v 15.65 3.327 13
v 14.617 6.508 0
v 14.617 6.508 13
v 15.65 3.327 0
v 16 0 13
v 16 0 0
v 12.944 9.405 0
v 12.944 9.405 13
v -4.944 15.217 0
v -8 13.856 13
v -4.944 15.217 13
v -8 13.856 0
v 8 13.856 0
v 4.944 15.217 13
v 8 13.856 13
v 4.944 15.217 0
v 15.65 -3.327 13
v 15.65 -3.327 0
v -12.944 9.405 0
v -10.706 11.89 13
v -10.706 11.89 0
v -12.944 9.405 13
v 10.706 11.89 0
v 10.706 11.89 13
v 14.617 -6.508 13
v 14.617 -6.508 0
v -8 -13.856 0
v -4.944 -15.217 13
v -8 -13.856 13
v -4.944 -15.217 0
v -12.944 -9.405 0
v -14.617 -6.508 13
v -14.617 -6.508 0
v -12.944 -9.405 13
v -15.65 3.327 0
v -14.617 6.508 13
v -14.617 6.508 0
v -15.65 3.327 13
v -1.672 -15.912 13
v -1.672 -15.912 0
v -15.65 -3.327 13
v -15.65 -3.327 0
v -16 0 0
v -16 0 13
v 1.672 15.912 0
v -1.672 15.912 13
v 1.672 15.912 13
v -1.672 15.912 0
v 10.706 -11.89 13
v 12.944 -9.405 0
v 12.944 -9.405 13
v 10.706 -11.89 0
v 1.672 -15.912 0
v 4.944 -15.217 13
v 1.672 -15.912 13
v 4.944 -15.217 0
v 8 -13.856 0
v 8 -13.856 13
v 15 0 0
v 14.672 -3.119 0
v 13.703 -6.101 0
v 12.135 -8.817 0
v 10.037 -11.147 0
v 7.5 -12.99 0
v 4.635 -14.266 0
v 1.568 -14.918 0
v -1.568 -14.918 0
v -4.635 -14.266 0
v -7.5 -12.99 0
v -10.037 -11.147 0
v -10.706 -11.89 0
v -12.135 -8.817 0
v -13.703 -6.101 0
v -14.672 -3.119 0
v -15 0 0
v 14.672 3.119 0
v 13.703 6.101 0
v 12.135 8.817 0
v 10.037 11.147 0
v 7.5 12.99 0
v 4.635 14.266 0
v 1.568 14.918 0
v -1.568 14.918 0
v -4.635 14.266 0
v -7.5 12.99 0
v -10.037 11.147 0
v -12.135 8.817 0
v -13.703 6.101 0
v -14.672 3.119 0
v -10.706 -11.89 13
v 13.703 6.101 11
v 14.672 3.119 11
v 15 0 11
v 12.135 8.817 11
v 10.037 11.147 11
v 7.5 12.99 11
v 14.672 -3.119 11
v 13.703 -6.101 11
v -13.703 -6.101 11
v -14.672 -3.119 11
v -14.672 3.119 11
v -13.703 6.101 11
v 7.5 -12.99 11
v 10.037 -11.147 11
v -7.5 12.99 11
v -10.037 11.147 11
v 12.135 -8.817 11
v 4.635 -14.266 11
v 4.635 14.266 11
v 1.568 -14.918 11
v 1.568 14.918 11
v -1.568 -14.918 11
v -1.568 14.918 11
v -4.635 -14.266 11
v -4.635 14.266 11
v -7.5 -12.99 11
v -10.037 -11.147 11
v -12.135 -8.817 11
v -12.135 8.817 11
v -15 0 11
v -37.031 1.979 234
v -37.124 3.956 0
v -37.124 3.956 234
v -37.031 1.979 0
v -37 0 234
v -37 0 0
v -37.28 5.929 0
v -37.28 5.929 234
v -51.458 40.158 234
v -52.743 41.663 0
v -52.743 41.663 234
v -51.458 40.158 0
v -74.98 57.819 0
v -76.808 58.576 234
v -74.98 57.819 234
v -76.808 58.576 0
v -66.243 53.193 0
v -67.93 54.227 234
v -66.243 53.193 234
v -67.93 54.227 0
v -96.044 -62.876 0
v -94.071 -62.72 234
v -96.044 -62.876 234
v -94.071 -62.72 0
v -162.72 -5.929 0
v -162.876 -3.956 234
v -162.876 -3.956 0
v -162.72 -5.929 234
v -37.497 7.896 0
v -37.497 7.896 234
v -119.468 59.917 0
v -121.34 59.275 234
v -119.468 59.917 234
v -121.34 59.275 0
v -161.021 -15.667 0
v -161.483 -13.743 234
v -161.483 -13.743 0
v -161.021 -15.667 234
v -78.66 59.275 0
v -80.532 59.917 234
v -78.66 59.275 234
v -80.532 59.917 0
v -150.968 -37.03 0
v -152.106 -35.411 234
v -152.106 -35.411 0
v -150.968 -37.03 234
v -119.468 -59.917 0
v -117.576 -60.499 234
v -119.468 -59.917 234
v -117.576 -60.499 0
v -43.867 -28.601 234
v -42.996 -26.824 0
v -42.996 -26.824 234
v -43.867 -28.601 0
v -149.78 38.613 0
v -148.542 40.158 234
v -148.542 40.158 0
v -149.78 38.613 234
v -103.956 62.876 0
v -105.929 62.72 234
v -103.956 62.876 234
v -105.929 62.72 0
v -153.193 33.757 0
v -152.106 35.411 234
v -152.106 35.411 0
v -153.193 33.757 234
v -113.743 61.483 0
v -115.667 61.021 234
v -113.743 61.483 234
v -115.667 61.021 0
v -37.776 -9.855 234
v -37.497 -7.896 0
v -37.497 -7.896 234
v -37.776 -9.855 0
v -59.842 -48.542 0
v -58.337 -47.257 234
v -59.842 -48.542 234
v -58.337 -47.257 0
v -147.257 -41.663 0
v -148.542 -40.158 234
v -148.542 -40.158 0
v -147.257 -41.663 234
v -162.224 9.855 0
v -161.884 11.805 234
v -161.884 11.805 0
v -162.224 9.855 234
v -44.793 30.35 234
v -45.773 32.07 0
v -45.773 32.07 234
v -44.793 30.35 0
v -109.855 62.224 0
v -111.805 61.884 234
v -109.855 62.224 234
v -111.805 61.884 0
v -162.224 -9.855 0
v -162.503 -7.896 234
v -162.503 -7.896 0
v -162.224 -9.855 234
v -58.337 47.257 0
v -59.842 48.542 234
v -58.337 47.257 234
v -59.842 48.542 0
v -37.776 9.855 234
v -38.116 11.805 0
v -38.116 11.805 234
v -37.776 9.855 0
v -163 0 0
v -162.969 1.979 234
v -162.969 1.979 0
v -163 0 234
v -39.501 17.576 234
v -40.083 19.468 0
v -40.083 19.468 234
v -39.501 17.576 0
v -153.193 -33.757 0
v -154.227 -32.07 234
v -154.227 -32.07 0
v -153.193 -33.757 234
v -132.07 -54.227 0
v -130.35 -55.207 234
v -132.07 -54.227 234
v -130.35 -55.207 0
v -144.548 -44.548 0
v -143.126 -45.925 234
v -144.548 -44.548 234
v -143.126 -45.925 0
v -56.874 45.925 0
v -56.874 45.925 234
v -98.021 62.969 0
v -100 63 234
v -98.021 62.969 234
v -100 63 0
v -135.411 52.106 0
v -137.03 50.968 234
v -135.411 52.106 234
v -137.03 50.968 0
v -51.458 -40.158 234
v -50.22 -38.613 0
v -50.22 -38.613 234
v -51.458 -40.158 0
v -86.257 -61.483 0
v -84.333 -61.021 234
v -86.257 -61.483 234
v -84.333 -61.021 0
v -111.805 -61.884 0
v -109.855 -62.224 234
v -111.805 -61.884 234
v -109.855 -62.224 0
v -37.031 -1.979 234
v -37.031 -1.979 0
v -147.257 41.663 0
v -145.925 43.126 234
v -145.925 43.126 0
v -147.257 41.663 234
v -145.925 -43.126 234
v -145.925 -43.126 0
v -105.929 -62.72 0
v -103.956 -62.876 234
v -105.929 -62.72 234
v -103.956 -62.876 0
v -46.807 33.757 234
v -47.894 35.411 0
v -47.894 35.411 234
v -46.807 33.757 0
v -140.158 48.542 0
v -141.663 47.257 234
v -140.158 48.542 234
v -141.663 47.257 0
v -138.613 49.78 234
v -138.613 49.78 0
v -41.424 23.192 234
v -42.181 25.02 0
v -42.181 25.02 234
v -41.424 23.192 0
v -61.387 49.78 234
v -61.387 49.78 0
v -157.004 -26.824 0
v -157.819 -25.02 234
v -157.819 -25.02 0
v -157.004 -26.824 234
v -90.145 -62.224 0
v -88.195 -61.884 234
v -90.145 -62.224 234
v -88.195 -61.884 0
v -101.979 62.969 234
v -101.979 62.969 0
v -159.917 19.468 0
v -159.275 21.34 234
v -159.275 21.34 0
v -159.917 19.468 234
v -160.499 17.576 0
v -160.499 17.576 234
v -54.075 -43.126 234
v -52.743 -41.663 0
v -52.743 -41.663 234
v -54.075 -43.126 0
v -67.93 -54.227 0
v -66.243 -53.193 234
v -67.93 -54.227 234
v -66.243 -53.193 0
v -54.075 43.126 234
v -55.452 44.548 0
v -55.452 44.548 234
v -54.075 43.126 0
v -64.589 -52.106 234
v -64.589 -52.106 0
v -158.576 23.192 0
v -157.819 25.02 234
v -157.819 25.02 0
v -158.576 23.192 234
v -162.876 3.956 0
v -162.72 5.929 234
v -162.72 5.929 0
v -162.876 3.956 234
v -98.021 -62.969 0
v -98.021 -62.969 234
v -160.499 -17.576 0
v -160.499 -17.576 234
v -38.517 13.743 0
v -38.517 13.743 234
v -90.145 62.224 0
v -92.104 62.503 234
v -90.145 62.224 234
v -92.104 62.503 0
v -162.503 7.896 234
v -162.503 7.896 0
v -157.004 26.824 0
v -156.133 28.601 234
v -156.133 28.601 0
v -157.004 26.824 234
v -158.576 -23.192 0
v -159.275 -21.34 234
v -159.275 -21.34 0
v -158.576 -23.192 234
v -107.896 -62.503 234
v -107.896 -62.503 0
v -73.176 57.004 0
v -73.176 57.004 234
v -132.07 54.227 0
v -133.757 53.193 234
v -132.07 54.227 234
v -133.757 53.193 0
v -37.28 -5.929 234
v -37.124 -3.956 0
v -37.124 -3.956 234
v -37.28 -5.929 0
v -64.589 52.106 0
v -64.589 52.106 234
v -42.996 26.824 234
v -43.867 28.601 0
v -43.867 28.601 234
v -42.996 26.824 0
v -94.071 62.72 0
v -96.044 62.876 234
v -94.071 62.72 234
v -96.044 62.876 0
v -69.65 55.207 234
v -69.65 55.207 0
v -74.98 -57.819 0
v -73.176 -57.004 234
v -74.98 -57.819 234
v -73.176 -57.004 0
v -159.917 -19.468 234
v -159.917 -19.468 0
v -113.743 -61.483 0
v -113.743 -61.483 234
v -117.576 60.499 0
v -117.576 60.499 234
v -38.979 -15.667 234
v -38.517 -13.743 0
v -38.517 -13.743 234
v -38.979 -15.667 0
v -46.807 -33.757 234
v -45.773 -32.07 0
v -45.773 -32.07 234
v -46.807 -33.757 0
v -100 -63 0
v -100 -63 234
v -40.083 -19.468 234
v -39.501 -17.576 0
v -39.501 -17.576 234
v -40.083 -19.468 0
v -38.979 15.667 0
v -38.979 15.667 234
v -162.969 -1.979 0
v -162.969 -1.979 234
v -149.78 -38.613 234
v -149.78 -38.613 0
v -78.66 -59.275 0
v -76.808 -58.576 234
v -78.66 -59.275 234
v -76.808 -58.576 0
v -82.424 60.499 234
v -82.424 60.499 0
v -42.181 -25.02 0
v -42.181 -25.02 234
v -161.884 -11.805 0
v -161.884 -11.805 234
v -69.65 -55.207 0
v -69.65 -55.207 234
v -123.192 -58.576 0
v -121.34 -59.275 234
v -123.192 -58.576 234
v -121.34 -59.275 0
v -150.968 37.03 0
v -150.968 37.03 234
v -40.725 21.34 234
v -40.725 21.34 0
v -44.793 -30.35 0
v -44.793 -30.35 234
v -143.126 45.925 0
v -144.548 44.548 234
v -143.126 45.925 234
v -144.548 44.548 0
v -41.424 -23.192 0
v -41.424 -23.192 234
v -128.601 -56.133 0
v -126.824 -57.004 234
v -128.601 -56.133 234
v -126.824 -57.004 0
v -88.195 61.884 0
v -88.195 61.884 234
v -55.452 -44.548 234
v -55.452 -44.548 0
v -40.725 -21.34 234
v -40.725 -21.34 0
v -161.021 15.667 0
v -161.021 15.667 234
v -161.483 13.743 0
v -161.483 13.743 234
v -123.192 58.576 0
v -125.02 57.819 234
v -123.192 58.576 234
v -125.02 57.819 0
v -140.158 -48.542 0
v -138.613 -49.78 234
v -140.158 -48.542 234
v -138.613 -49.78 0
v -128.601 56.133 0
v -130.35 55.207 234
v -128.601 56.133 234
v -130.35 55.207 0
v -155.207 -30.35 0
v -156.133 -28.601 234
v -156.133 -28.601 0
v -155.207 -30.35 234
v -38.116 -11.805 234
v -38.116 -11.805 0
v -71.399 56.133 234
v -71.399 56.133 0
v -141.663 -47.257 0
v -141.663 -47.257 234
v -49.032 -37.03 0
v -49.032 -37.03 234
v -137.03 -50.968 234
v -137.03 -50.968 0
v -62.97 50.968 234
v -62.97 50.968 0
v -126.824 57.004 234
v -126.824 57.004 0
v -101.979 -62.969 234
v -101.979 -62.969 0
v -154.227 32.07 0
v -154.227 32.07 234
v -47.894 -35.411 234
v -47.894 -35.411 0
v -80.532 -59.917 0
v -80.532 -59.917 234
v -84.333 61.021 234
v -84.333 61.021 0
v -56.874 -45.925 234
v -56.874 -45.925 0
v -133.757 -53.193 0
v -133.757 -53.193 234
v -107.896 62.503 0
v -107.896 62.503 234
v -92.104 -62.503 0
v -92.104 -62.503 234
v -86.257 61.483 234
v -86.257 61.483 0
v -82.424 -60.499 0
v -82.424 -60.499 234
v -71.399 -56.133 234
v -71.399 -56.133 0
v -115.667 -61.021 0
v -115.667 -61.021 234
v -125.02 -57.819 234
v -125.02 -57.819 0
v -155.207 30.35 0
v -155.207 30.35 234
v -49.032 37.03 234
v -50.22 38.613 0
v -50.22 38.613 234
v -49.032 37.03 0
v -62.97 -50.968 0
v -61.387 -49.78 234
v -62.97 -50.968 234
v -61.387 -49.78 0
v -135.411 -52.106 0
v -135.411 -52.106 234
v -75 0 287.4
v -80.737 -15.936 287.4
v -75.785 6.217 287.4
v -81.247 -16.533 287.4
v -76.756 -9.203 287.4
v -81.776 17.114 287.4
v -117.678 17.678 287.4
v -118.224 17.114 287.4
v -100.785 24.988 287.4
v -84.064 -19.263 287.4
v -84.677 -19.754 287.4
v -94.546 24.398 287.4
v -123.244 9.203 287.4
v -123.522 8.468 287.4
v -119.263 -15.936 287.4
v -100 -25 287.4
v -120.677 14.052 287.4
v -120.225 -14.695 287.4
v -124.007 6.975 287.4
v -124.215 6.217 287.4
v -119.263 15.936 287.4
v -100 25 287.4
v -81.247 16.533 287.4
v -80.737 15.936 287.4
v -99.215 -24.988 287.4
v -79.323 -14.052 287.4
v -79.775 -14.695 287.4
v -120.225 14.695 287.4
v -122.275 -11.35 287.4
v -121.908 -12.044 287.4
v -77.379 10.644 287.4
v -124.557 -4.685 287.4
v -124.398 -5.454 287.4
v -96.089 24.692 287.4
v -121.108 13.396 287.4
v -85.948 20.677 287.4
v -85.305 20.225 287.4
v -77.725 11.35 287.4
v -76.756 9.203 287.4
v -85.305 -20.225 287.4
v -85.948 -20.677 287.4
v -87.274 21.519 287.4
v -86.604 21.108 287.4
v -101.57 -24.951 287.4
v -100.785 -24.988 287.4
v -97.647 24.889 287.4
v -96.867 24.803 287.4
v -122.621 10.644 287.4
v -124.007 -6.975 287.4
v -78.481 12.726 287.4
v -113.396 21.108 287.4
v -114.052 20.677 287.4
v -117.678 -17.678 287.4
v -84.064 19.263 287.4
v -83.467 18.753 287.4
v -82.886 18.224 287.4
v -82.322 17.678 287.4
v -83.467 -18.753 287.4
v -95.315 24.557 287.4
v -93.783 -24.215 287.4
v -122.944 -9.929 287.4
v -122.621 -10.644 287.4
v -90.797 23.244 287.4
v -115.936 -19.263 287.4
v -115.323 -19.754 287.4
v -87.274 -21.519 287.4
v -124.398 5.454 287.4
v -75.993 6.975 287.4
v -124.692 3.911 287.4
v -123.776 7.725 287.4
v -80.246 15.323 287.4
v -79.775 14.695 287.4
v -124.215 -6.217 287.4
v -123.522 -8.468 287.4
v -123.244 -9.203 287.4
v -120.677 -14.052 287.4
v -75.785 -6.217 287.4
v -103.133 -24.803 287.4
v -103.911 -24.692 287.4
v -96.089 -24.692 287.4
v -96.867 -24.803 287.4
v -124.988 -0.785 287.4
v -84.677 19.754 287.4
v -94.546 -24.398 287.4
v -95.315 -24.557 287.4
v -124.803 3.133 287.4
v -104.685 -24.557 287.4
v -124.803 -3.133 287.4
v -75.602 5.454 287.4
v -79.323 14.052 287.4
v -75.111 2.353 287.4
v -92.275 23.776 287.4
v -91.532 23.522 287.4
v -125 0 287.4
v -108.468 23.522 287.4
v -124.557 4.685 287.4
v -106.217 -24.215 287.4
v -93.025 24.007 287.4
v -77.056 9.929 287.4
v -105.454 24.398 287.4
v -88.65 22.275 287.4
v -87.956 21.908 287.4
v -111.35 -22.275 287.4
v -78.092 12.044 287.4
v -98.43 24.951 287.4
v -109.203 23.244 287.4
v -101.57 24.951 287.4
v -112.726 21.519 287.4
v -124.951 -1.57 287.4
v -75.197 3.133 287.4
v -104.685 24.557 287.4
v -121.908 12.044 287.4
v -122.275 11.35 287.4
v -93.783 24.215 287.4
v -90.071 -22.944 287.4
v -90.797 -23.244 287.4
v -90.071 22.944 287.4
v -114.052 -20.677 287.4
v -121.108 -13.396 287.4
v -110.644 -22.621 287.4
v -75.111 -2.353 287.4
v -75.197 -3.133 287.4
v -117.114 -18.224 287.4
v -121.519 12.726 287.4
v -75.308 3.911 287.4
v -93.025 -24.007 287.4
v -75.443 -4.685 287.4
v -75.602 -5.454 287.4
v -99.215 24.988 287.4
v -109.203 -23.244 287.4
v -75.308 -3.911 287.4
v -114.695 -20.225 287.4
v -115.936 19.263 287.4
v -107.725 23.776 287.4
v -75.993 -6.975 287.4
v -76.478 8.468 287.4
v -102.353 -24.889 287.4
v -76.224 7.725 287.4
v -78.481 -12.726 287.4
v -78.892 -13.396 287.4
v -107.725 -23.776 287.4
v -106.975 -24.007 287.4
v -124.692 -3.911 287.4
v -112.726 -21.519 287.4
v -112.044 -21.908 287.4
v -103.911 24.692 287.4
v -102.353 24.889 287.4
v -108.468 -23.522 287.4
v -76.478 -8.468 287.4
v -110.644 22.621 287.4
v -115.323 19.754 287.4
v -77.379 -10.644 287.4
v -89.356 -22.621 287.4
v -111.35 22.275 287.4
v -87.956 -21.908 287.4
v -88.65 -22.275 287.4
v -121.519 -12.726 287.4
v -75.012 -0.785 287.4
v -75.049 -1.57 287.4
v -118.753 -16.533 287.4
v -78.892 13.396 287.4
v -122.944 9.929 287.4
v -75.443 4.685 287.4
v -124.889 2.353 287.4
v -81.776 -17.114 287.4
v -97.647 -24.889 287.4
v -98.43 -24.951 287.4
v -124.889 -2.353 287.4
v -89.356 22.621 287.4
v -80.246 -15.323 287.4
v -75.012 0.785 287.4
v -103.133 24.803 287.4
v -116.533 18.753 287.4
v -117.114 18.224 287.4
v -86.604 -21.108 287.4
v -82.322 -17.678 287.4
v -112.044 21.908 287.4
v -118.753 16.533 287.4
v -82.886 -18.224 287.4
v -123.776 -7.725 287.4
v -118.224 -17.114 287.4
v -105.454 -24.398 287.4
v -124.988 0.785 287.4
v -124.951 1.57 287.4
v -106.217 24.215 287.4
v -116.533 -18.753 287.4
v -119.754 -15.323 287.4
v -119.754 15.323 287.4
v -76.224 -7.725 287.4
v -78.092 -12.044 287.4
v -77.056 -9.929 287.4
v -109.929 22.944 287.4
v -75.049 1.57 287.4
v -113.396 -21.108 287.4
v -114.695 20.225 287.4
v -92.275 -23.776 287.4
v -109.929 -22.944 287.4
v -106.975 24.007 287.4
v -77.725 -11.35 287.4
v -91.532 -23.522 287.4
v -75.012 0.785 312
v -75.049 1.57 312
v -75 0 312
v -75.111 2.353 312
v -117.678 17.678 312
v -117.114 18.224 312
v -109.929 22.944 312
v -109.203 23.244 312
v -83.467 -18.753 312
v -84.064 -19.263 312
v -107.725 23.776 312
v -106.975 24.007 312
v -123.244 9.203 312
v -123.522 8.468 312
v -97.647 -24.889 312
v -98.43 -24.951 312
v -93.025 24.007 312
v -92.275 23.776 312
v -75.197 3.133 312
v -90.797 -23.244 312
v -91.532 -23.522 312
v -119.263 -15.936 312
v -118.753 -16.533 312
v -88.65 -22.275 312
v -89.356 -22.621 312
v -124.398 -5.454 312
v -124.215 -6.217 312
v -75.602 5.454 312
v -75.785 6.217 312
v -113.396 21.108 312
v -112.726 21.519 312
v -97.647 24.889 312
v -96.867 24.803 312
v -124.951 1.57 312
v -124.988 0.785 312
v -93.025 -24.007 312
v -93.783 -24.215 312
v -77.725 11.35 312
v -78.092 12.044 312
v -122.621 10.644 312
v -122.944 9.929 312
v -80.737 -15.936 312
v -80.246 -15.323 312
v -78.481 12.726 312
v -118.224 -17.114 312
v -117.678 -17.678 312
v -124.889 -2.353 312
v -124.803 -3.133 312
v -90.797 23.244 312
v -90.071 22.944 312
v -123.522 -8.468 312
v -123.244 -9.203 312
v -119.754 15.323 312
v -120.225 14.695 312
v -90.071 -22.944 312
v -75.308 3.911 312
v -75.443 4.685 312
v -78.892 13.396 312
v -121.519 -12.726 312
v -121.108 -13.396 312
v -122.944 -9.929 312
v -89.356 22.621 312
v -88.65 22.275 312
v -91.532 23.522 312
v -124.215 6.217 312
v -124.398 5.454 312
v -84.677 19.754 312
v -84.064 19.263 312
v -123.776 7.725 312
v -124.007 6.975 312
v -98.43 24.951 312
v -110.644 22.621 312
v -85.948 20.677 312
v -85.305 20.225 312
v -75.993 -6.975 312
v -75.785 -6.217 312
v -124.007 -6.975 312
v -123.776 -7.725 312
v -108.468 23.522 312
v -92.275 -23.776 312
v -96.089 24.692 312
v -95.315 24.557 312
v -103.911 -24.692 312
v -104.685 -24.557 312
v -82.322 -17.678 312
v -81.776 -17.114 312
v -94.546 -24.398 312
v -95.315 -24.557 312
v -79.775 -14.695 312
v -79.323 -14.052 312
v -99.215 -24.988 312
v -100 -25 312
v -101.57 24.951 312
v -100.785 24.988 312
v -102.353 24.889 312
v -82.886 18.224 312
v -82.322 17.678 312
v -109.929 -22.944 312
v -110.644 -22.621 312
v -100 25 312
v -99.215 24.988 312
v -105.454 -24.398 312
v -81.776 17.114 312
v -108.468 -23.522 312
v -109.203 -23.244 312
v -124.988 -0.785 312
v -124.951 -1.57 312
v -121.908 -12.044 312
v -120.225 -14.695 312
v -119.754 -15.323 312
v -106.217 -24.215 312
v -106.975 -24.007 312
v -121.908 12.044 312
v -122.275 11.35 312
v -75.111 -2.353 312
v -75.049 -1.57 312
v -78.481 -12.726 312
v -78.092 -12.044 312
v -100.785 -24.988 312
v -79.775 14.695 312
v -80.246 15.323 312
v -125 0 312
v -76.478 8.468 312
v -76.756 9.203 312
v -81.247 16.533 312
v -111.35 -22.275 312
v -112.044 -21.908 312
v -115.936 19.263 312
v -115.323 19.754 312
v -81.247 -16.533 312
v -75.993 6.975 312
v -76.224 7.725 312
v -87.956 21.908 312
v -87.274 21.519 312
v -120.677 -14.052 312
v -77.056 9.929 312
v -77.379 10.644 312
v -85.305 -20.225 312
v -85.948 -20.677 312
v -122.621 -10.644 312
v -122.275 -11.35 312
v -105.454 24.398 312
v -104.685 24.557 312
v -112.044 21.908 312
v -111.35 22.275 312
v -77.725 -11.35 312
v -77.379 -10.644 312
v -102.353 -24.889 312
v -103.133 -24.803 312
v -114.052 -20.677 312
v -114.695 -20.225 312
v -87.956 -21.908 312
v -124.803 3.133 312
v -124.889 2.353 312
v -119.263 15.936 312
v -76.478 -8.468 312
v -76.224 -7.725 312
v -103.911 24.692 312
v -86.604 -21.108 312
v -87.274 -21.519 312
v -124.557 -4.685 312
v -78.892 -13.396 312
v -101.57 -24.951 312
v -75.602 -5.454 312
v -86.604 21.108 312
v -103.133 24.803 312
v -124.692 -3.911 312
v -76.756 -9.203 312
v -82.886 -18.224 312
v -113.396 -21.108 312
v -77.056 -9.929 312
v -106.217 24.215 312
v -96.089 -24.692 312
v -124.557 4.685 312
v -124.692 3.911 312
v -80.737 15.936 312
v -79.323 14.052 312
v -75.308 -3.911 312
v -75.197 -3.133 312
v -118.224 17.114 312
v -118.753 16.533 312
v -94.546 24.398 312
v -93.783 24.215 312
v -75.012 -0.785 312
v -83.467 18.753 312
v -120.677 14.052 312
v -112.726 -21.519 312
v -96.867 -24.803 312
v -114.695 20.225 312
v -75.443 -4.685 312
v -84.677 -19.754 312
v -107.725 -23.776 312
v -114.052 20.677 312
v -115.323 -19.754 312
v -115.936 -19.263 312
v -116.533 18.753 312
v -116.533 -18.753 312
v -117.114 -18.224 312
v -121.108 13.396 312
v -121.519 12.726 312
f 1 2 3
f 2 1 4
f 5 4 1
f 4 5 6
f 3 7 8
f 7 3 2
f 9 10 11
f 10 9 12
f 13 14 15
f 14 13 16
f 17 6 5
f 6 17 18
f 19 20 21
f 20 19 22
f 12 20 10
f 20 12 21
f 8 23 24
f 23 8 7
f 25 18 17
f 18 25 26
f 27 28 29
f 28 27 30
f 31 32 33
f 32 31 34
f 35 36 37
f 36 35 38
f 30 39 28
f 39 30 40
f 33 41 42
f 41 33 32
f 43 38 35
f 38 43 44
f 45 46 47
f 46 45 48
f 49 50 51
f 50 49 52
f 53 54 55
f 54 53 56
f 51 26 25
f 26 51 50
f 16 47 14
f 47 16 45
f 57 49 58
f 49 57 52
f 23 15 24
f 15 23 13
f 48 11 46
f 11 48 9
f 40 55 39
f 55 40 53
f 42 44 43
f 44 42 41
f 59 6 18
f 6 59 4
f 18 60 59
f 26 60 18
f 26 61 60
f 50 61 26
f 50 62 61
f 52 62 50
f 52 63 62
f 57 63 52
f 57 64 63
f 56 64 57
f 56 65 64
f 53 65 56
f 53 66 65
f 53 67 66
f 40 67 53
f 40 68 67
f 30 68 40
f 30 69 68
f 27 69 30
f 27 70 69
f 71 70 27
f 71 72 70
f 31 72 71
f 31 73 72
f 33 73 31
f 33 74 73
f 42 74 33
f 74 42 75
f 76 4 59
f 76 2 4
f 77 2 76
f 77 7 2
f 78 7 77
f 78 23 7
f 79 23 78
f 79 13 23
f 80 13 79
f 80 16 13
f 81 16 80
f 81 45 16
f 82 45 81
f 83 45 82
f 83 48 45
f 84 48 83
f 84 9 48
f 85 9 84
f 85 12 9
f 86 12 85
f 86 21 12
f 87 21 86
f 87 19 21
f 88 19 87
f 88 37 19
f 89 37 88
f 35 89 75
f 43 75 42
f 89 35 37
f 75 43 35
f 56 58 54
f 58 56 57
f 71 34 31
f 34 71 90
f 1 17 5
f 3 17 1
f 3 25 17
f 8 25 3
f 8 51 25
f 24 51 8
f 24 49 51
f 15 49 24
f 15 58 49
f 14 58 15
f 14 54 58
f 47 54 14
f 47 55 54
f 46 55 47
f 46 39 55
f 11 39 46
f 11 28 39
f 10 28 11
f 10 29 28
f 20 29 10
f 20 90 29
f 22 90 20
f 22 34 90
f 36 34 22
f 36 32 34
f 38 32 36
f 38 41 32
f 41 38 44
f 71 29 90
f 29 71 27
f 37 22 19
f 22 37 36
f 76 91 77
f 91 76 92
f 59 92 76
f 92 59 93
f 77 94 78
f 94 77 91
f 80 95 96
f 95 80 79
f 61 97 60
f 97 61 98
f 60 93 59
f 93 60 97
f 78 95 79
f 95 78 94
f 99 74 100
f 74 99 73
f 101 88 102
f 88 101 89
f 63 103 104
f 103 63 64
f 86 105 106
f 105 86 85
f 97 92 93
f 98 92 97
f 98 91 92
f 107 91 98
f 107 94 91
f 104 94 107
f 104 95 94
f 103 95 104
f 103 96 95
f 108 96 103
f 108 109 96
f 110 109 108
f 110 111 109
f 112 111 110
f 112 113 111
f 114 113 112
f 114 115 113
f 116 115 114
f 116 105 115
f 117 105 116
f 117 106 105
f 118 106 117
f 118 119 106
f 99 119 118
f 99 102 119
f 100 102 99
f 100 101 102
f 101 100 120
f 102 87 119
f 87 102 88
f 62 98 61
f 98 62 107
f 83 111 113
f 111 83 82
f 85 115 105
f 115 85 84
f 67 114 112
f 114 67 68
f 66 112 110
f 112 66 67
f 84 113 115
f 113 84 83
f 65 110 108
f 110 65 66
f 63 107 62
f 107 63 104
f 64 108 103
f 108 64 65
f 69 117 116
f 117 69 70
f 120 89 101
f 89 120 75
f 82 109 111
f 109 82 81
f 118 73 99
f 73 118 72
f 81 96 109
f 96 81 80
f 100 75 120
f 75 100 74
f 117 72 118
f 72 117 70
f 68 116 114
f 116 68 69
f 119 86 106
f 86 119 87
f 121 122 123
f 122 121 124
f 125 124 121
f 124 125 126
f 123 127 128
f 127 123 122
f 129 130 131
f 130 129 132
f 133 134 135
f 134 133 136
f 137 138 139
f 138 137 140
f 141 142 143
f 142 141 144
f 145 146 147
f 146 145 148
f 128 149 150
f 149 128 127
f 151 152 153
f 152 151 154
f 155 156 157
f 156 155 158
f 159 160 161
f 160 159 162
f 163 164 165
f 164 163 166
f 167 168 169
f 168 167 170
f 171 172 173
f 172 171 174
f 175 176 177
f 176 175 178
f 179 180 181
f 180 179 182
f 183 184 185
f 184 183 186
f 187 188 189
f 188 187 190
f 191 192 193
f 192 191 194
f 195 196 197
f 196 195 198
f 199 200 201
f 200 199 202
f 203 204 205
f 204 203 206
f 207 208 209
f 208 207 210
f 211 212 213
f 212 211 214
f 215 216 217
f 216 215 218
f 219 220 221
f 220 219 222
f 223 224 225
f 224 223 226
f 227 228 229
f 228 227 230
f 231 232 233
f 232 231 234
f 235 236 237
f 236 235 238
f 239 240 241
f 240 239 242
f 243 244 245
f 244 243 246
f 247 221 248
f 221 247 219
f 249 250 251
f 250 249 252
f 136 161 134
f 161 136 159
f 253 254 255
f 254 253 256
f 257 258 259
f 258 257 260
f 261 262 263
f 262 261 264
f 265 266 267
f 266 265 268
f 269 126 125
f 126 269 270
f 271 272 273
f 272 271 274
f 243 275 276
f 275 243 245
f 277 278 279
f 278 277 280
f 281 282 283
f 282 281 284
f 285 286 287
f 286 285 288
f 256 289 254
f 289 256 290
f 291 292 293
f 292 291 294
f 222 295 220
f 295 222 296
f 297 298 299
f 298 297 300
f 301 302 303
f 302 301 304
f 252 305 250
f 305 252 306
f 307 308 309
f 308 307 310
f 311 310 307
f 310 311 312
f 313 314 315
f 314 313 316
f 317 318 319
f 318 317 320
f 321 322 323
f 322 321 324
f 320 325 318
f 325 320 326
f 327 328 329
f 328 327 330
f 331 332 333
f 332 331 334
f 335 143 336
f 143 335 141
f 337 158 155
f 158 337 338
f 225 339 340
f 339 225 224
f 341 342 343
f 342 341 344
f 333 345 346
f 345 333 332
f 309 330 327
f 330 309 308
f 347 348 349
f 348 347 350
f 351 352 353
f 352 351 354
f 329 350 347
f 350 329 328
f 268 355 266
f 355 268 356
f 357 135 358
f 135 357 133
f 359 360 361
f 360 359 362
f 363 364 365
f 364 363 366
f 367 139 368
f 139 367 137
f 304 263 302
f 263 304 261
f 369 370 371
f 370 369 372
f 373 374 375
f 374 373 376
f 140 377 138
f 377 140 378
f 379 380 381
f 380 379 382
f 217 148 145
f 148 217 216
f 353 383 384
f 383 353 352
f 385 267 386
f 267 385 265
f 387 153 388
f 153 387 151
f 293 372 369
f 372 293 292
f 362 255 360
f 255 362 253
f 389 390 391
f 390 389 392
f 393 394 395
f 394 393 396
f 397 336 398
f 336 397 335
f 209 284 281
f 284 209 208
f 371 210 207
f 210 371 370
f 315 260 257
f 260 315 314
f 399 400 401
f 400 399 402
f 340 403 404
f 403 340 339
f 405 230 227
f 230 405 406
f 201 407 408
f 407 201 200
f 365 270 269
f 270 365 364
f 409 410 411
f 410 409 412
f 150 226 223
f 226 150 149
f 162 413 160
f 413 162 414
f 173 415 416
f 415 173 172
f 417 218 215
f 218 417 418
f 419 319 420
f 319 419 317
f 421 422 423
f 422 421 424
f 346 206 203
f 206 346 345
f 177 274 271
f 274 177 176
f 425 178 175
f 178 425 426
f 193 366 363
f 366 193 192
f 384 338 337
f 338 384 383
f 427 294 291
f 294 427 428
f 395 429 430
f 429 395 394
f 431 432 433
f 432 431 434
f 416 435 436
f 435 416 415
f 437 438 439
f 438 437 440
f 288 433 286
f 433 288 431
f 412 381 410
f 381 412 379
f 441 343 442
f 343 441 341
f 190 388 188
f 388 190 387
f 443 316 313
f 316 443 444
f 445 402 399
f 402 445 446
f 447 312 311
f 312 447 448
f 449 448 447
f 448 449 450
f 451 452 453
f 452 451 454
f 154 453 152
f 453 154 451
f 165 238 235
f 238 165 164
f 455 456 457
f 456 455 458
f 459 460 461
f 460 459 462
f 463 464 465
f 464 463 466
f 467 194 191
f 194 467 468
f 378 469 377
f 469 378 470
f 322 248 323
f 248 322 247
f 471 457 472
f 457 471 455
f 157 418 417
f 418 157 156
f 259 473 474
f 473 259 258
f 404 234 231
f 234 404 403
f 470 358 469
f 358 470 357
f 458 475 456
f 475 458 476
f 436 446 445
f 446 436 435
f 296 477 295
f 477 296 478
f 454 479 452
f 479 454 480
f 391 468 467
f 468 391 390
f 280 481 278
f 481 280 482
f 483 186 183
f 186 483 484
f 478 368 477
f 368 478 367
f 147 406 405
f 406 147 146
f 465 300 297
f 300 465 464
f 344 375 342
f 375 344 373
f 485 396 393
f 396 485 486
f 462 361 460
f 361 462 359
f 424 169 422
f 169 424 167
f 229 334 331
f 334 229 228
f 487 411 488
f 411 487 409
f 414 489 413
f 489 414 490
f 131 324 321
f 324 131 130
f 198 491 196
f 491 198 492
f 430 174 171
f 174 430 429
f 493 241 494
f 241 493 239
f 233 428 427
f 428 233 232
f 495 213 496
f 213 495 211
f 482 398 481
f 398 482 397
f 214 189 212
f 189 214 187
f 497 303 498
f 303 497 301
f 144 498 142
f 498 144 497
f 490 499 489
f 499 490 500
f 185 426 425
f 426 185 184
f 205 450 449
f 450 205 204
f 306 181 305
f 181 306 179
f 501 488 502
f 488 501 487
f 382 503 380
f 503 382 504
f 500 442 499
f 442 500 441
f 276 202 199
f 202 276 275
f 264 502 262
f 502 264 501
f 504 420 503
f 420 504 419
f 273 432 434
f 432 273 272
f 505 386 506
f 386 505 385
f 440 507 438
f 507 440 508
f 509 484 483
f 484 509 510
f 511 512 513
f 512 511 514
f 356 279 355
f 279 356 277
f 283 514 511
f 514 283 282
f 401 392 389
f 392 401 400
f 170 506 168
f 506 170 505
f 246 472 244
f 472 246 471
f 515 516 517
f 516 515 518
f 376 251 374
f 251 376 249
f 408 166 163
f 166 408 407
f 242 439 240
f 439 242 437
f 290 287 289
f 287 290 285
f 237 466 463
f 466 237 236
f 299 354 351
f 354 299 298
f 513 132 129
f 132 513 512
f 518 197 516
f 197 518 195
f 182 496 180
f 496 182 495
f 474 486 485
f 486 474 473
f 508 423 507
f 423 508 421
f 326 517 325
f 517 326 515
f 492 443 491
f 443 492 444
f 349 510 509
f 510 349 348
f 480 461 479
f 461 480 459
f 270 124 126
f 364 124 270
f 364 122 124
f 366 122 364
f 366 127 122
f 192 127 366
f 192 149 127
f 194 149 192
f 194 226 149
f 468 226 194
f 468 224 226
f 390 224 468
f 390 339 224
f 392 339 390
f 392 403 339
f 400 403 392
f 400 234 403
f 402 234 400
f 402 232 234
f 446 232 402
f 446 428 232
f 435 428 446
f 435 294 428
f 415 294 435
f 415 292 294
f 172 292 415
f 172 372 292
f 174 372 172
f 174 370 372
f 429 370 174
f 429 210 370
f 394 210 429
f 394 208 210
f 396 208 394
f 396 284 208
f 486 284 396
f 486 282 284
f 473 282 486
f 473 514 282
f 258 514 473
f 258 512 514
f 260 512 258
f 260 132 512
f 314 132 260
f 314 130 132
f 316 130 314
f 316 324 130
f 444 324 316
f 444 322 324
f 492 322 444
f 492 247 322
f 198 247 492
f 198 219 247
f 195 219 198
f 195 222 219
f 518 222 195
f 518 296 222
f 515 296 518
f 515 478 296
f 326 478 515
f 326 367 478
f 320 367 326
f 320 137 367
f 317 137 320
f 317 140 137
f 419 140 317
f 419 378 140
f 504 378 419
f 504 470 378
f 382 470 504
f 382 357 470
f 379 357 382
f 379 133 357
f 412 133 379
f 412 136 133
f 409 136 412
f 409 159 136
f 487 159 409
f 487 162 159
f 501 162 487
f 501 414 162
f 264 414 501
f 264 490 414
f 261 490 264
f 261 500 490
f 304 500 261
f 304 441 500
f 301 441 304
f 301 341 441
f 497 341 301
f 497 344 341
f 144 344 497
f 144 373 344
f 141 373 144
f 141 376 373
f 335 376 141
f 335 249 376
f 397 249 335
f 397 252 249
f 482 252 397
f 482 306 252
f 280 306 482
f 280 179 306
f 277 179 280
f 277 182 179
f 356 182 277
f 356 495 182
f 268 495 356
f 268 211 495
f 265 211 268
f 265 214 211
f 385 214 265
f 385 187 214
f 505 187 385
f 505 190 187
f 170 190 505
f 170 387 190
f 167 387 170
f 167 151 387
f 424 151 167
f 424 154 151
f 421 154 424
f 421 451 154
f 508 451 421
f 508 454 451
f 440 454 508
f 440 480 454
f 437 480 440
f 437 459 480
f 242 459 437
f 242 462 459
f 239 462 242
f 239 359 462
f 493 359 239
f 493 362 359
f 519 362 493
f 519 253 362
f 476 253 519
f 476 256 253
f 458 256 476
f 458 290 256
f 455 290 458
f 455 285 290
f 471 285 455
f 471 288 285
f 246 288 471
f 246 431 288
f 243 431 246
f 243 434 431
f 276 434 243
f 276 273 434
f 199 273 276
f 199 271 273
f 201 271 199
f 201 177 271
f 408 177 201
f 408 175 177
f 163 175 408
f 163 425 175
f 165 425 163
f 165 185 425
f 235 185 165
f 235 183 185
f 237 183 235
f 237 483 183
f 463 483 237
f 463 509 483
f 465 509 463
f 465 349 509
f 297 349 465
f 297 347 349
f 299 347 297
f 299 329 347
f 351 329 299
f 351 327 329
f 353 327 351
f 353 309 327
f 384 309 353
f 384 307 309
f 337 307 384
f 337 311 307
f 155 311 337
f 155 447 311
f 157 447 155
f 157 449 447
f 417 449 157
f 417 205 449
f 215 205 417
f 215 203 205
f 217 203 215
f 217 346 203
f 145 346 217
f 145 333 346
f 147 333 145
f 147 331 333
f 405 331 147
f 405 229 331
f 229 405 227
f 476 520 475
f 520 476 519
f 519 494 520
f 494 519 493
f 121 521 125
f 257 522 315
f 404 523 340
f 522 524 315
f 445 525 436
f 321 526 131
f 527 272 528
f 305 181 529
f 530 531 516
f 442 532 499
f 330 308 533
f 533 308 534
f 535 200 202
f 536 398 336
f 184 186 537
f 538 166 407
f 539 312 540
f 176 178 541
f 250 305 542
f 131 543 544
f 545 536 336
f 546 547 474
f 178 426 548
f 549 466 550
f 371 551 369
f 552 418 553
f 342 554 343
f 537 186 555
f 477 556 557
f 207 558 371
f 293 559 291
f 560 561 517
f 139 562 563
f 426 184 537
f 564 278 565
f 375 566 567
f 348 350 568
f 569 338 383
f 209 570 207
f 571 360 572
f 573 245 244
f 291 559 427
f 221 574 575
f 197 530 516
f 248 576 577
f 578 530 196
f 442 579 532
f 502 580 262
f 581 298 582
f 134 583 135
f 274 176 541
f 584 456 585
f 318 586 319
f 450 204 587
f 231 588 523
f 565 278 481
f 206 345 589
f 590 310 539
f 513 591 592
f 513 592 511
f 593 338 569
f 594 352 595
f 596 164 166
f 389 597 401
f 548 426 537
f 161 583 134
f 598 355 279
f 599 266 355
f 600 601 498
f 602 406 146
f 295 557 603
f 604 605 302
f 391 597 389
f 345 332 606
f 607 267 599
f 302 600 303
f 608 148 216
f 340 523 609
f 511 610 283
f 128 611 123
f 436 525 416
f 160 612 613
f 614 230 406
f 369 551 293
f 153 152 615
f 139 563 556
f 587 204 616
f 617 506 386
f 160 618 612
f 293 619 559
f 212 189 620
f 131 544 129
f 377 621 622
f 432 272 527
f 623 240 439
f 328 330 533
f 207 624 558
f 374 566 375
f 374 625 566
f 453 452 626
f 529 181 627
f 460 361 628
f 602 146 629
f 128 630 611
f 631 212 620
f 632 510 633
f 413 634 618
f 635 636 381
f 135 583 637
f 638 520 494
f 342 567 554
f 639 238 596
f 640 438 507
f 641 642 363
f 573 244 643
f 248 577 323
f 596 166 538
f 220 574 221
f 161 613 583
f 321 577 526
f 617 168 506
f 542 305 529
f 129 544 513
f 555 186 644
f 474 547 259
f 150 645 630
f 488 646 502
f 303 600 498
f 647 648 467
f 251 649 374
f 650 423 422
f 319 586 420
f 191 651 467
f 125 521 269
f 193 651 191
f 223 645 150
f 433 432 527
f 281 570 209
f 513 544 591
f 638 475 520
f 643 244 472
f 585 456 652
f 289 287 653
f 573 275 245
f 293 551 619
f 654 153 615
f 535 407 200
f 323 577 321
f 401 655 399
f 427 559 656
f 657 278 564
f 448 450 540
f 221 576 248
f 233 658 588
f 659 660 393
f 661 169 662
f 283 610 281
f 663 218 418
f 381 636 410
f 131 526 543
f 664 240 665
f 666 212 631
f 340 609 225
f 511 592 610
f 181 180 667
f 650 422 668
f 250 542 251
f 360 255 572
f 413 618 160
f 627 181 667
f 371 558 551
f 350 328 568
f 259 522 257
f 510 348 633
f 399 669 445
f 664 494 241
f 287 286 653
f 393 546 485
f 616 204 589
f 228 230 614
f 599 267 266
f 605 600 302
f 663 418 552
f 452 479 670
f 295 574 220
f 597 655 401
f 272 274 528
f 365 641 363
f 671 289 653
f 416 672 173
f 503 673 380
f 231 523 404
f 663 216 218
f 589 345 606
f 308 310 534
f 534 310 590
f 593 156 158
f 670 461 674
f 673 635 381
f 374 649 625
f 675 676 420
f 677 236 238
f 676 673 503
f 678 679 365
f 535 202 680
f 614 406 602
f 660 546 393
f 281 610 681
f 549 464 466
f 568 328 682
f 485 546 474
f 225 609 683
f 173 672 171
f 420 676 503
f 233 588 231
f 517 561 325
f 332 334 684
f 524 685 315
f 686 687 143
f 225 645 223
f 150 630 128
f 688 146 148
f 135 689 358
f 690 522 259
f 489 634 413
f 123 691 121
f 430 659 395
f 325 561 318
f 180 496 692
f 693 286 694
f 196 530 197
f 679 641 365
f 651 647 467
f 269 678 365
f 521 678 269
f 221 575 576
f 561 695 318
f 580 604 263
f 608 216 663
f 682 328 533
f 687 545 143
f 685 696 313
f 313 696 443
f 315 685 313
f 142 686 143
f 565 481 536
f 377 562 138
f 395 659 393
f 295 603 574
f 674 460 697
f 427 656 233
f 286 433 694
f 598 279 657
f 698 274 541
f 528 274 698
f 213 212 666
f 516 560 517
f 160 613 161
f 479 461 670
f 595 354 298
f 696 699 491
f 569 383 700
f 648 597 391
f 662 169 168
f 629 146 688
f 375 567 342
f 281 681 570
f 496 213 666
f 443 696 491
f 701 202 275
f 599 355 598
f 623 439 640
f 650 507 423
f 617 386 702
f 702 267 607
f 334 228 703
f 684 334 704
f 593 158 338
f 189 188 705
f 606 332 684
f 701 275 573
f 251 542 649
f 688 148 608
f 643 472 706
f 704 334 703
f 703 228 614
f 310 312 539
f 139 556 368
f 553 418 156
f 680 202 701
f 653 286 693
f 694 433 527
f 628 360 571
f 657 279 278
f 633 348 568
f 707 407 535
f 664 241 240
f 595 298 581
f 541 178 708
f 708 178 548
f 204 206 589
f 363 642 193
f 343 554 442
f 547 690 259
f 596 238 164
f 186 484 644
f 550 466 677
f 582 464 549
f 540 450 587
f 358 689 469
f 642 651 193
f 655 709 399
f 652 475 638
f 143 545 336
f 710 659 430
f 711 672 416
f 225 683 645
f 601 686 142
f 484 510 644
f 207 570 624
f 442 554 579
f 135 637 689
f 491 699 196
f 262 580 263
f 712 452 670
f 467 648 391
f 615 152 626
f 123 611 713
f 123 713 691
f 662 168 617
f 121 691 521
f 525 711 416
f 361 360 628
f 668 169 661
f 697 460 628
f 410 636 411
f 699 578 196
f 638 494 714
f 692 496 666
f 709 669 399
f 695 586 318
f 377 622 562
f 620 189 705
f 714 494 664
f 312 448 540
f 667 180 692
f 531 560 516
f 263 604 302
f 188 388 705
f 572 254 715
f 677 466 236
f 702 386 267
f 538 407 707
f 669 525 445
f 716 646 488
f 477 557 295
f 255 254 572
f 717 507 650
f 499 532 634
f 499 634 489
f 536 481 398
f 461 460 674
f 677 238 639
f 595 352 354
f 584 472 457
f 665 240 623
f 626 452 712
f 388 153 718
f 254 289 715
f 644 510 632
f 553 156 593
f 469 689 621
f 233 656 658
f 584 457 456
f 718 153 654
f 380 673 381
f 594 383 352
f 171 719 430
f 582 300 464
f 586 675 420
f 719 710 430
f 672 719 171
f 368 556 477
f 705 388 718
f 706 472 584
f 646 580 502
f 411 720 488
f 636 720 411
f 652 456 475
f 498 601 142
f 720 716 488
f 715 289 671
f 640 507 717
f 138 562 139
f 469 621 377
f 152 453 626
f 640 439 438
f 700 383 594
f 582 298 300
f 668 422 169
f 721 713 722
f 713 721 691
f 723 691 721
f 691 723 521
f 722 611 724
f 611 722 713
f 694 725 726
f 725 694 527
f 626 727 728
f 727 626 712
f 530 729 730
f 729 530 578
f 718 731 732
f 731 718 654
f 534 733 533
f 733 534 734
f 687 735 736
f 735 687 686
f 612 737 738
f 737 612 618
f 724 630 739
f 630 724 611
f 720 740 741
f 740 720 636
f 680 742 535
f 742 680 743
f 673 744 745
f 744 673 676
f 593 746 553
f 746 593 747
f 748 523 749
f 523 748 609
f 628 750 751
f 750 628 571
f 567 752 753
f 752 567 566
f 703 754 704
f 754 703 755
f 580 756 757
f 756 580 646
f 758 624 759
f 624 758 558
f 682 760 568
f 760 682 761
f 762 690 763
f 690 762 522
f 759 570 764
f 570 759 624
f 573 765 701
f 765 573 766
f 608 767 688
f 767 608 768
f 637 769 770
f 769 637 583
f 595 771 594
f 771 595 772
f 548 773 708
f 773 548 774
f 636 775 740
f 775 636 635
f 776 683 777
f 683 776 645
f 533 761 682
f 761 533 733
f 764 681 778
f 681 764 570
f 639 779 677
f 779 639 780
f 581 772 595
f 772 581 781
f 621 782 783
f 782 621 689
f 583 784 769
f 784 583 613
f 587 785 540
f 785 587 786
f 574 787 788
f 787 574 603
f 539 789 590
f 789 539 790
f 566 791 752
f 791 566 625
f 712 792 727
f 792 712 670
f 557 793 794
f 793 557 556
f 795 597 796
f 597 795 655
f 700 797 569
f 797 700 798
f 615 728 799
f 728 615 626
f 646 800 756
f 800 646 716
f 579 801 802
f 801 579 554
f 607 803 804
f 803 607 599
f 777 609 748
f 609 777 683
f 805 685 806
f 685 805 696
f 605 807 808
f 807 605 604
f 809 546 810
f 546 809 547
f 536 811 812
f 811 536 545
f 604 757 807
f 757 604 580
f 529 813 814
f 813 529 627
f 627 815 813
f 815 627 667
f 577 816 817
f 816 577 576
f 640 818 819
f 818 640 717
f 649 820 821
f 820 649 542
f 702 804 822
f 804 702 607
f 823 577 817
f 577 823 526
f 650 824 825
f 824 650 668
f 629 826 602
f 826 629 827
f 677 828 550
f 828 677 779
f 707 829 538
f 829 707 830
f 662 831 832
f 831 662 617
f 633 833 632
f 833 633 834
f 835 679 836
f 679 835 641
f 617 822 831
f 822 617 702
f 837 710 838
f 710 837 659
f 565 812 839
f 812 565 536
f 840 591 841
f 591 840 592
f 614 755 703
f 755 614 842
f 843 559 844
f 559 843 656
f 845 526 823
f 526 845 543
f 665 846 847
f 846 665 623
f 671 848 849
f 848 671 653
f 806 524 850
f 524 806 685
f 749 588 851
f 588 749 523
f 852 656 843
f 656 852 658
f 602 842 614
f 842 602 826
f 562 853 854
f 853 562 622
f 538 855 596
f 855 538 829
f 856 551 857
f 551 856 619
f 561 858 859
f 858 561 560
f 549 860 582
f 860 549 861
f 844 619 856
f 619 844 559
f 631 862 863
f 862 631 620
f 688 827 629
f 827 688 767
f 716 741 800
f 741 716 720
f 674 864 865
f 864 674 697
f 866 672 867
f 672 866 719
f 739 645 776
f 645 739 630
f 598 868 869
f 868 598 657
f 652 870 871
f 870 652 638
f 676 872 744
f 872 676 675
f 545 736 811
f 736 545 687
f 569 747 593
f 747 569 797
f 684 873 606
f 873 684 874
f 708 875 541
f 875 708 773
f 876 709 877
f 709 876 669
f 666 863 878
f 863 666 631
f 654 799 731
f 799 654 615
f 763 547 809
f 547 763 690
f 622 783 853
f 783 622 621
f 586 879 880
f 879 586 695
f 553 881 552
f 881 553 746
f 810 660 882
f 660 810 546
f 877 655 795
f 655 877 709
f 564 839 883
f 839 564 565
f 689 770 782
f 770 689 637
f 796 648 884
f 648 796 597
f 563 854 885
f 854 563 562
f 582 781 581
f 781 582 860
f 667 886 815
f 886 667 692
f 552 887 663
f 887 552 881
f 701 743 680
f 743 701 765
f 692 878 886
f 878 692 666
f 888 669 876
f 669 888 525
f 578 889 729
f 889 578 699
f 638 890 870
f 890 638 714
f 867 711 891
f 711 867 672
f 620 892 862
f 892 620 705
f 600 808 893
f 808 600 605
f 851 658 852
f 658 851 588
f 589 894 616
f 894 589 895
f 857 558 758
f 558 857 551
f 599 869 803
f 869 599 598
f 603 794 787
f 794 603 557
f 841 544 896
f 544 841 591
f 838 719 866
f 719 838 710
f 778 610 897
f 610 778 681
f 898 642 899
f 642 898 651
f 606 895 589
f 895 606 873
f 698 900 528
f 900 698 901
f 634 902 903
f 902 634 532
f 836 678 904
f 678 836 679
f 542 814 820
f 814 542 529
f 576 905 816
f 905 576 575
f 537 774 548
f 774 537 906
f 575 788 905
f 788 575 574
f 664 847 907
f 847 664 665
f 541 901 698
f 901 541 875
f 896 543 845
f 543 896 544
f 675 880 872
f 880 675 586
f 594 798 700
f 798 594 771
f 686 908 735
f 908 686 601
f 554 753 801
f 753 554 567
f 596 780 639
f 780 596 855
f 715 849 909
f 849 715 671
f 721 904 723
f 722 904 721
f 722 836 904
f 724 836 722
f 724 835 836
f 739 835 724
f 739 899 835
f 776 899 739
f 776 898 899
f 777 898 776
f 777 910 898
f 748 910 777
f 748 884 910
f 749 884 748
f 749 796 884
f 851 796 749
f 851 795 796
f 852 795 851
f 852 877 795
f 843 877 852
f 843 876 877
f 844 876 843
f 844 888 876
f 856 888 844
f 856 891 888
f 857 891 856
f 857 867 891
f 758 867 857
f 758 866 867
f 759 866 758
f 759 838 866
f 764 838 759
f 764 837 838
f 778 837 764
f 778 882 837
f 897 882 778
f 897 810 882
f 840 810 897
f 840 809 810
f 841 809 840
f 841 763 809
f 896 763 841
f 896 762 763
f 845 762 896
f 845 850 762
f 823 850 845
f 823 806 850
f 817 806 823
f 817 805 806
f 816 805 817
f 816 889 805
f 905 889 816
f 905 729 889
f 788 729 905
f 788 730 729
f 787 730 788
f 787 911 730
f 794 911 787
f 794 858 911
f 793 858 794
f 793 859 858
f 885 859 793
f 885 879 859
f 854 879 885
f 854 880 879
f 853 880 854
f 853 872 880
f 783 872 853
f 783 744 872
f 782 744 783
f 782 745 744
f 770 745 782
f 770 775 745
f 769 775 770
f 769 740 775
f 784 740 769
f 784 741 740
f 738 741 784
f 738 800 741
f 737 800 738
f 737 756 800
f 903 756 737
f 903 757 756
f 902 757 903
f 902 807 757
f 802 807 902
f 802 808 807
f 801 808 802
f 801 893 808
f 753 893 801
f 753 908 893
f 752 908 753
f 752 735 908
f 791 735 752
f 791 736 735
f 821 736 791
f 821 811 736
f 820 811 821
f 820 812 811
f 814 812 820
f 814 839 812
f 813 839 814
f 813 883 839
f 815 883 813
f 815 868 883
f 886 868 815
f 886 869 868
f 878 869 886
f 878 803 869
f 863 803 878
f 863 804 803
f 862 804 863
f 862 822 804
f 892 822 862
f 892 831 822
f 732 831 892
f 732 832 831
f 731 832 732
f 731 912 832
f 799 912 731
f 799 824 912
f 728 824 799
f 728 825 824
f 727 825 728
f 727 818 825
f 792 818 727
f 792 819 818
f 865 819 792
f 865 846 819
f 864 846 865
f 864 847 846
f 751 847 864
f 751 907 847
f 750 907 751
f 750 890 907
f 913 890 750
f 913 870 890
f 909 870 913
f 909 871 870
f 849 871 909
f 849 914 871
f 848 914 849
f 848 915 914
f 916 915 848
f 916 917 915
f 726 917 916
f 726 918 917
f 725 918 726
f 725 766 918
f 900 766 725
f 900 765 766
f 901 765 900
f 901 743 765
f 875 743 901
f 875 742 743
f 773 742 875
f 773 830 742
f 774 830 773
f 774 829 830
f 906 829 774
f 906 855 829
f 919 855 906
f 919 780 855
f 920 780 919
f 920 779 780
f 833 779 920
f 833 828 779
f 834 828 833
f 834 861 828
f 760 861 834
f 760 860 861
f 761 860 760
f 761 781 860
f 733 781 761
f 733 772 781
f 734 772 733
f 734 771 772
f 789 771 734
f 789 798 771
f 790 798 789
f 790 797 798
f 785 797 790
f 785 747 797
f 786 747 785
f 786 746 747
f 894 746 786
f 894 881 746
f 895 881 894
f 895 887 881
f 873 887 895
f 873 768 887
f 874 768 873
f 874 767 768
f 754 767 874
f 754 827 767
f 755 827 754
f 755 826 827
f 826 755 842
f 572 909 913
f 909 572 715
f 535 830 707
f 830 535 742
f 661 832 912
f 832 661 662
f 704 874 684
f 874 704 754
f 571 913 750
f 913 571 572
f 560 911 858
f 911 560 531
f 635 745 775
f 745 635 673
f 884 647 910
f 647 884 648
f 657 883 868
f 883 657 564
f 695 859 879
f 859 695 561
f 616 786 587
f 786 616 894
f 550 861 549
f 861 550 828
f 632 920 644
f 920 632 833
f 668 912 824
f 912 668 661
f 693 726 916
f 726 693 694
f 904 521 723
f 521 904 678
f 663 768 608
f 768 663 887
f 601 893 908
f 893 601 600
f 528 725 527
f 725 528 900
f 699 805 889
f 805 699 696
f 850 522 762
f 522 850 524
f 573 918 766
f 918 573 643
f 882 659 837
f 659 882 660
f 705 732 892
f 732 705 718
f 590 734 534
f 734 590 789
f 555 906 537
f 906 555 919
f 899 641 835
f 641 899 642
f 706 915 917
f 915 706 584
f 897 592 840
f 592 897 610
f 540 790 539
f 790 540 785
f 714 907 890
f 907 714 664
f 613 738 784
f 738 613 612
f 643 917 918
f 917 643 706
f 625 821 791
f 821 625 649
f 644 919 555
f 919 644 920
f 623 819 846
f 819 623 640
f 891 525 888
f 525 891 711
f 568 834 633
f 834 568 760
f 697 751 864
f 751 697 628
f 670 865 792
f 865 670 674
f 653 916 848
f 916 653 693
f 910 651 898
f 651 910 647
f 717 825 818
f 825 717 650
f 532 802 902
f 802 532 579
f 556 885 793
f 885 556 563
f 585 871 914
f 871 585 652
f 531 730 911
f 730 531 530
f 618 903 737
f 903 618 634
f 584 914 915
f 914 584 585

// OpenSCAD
module bouteille(){
    cylinder(234,d=63*2,$fn=200);
translate([0,0,234])
cylinder(53.4,63,25,$fn=200);
translate([0,0,287.4])
cylinder(24.6,d=25*2,$fn=200);}

difference(){
    cylinder(13,d=32);
    translate([0,0,-2])
    cylinder(13,d=30);
}
translate([-100,0,0])
bouteille();
